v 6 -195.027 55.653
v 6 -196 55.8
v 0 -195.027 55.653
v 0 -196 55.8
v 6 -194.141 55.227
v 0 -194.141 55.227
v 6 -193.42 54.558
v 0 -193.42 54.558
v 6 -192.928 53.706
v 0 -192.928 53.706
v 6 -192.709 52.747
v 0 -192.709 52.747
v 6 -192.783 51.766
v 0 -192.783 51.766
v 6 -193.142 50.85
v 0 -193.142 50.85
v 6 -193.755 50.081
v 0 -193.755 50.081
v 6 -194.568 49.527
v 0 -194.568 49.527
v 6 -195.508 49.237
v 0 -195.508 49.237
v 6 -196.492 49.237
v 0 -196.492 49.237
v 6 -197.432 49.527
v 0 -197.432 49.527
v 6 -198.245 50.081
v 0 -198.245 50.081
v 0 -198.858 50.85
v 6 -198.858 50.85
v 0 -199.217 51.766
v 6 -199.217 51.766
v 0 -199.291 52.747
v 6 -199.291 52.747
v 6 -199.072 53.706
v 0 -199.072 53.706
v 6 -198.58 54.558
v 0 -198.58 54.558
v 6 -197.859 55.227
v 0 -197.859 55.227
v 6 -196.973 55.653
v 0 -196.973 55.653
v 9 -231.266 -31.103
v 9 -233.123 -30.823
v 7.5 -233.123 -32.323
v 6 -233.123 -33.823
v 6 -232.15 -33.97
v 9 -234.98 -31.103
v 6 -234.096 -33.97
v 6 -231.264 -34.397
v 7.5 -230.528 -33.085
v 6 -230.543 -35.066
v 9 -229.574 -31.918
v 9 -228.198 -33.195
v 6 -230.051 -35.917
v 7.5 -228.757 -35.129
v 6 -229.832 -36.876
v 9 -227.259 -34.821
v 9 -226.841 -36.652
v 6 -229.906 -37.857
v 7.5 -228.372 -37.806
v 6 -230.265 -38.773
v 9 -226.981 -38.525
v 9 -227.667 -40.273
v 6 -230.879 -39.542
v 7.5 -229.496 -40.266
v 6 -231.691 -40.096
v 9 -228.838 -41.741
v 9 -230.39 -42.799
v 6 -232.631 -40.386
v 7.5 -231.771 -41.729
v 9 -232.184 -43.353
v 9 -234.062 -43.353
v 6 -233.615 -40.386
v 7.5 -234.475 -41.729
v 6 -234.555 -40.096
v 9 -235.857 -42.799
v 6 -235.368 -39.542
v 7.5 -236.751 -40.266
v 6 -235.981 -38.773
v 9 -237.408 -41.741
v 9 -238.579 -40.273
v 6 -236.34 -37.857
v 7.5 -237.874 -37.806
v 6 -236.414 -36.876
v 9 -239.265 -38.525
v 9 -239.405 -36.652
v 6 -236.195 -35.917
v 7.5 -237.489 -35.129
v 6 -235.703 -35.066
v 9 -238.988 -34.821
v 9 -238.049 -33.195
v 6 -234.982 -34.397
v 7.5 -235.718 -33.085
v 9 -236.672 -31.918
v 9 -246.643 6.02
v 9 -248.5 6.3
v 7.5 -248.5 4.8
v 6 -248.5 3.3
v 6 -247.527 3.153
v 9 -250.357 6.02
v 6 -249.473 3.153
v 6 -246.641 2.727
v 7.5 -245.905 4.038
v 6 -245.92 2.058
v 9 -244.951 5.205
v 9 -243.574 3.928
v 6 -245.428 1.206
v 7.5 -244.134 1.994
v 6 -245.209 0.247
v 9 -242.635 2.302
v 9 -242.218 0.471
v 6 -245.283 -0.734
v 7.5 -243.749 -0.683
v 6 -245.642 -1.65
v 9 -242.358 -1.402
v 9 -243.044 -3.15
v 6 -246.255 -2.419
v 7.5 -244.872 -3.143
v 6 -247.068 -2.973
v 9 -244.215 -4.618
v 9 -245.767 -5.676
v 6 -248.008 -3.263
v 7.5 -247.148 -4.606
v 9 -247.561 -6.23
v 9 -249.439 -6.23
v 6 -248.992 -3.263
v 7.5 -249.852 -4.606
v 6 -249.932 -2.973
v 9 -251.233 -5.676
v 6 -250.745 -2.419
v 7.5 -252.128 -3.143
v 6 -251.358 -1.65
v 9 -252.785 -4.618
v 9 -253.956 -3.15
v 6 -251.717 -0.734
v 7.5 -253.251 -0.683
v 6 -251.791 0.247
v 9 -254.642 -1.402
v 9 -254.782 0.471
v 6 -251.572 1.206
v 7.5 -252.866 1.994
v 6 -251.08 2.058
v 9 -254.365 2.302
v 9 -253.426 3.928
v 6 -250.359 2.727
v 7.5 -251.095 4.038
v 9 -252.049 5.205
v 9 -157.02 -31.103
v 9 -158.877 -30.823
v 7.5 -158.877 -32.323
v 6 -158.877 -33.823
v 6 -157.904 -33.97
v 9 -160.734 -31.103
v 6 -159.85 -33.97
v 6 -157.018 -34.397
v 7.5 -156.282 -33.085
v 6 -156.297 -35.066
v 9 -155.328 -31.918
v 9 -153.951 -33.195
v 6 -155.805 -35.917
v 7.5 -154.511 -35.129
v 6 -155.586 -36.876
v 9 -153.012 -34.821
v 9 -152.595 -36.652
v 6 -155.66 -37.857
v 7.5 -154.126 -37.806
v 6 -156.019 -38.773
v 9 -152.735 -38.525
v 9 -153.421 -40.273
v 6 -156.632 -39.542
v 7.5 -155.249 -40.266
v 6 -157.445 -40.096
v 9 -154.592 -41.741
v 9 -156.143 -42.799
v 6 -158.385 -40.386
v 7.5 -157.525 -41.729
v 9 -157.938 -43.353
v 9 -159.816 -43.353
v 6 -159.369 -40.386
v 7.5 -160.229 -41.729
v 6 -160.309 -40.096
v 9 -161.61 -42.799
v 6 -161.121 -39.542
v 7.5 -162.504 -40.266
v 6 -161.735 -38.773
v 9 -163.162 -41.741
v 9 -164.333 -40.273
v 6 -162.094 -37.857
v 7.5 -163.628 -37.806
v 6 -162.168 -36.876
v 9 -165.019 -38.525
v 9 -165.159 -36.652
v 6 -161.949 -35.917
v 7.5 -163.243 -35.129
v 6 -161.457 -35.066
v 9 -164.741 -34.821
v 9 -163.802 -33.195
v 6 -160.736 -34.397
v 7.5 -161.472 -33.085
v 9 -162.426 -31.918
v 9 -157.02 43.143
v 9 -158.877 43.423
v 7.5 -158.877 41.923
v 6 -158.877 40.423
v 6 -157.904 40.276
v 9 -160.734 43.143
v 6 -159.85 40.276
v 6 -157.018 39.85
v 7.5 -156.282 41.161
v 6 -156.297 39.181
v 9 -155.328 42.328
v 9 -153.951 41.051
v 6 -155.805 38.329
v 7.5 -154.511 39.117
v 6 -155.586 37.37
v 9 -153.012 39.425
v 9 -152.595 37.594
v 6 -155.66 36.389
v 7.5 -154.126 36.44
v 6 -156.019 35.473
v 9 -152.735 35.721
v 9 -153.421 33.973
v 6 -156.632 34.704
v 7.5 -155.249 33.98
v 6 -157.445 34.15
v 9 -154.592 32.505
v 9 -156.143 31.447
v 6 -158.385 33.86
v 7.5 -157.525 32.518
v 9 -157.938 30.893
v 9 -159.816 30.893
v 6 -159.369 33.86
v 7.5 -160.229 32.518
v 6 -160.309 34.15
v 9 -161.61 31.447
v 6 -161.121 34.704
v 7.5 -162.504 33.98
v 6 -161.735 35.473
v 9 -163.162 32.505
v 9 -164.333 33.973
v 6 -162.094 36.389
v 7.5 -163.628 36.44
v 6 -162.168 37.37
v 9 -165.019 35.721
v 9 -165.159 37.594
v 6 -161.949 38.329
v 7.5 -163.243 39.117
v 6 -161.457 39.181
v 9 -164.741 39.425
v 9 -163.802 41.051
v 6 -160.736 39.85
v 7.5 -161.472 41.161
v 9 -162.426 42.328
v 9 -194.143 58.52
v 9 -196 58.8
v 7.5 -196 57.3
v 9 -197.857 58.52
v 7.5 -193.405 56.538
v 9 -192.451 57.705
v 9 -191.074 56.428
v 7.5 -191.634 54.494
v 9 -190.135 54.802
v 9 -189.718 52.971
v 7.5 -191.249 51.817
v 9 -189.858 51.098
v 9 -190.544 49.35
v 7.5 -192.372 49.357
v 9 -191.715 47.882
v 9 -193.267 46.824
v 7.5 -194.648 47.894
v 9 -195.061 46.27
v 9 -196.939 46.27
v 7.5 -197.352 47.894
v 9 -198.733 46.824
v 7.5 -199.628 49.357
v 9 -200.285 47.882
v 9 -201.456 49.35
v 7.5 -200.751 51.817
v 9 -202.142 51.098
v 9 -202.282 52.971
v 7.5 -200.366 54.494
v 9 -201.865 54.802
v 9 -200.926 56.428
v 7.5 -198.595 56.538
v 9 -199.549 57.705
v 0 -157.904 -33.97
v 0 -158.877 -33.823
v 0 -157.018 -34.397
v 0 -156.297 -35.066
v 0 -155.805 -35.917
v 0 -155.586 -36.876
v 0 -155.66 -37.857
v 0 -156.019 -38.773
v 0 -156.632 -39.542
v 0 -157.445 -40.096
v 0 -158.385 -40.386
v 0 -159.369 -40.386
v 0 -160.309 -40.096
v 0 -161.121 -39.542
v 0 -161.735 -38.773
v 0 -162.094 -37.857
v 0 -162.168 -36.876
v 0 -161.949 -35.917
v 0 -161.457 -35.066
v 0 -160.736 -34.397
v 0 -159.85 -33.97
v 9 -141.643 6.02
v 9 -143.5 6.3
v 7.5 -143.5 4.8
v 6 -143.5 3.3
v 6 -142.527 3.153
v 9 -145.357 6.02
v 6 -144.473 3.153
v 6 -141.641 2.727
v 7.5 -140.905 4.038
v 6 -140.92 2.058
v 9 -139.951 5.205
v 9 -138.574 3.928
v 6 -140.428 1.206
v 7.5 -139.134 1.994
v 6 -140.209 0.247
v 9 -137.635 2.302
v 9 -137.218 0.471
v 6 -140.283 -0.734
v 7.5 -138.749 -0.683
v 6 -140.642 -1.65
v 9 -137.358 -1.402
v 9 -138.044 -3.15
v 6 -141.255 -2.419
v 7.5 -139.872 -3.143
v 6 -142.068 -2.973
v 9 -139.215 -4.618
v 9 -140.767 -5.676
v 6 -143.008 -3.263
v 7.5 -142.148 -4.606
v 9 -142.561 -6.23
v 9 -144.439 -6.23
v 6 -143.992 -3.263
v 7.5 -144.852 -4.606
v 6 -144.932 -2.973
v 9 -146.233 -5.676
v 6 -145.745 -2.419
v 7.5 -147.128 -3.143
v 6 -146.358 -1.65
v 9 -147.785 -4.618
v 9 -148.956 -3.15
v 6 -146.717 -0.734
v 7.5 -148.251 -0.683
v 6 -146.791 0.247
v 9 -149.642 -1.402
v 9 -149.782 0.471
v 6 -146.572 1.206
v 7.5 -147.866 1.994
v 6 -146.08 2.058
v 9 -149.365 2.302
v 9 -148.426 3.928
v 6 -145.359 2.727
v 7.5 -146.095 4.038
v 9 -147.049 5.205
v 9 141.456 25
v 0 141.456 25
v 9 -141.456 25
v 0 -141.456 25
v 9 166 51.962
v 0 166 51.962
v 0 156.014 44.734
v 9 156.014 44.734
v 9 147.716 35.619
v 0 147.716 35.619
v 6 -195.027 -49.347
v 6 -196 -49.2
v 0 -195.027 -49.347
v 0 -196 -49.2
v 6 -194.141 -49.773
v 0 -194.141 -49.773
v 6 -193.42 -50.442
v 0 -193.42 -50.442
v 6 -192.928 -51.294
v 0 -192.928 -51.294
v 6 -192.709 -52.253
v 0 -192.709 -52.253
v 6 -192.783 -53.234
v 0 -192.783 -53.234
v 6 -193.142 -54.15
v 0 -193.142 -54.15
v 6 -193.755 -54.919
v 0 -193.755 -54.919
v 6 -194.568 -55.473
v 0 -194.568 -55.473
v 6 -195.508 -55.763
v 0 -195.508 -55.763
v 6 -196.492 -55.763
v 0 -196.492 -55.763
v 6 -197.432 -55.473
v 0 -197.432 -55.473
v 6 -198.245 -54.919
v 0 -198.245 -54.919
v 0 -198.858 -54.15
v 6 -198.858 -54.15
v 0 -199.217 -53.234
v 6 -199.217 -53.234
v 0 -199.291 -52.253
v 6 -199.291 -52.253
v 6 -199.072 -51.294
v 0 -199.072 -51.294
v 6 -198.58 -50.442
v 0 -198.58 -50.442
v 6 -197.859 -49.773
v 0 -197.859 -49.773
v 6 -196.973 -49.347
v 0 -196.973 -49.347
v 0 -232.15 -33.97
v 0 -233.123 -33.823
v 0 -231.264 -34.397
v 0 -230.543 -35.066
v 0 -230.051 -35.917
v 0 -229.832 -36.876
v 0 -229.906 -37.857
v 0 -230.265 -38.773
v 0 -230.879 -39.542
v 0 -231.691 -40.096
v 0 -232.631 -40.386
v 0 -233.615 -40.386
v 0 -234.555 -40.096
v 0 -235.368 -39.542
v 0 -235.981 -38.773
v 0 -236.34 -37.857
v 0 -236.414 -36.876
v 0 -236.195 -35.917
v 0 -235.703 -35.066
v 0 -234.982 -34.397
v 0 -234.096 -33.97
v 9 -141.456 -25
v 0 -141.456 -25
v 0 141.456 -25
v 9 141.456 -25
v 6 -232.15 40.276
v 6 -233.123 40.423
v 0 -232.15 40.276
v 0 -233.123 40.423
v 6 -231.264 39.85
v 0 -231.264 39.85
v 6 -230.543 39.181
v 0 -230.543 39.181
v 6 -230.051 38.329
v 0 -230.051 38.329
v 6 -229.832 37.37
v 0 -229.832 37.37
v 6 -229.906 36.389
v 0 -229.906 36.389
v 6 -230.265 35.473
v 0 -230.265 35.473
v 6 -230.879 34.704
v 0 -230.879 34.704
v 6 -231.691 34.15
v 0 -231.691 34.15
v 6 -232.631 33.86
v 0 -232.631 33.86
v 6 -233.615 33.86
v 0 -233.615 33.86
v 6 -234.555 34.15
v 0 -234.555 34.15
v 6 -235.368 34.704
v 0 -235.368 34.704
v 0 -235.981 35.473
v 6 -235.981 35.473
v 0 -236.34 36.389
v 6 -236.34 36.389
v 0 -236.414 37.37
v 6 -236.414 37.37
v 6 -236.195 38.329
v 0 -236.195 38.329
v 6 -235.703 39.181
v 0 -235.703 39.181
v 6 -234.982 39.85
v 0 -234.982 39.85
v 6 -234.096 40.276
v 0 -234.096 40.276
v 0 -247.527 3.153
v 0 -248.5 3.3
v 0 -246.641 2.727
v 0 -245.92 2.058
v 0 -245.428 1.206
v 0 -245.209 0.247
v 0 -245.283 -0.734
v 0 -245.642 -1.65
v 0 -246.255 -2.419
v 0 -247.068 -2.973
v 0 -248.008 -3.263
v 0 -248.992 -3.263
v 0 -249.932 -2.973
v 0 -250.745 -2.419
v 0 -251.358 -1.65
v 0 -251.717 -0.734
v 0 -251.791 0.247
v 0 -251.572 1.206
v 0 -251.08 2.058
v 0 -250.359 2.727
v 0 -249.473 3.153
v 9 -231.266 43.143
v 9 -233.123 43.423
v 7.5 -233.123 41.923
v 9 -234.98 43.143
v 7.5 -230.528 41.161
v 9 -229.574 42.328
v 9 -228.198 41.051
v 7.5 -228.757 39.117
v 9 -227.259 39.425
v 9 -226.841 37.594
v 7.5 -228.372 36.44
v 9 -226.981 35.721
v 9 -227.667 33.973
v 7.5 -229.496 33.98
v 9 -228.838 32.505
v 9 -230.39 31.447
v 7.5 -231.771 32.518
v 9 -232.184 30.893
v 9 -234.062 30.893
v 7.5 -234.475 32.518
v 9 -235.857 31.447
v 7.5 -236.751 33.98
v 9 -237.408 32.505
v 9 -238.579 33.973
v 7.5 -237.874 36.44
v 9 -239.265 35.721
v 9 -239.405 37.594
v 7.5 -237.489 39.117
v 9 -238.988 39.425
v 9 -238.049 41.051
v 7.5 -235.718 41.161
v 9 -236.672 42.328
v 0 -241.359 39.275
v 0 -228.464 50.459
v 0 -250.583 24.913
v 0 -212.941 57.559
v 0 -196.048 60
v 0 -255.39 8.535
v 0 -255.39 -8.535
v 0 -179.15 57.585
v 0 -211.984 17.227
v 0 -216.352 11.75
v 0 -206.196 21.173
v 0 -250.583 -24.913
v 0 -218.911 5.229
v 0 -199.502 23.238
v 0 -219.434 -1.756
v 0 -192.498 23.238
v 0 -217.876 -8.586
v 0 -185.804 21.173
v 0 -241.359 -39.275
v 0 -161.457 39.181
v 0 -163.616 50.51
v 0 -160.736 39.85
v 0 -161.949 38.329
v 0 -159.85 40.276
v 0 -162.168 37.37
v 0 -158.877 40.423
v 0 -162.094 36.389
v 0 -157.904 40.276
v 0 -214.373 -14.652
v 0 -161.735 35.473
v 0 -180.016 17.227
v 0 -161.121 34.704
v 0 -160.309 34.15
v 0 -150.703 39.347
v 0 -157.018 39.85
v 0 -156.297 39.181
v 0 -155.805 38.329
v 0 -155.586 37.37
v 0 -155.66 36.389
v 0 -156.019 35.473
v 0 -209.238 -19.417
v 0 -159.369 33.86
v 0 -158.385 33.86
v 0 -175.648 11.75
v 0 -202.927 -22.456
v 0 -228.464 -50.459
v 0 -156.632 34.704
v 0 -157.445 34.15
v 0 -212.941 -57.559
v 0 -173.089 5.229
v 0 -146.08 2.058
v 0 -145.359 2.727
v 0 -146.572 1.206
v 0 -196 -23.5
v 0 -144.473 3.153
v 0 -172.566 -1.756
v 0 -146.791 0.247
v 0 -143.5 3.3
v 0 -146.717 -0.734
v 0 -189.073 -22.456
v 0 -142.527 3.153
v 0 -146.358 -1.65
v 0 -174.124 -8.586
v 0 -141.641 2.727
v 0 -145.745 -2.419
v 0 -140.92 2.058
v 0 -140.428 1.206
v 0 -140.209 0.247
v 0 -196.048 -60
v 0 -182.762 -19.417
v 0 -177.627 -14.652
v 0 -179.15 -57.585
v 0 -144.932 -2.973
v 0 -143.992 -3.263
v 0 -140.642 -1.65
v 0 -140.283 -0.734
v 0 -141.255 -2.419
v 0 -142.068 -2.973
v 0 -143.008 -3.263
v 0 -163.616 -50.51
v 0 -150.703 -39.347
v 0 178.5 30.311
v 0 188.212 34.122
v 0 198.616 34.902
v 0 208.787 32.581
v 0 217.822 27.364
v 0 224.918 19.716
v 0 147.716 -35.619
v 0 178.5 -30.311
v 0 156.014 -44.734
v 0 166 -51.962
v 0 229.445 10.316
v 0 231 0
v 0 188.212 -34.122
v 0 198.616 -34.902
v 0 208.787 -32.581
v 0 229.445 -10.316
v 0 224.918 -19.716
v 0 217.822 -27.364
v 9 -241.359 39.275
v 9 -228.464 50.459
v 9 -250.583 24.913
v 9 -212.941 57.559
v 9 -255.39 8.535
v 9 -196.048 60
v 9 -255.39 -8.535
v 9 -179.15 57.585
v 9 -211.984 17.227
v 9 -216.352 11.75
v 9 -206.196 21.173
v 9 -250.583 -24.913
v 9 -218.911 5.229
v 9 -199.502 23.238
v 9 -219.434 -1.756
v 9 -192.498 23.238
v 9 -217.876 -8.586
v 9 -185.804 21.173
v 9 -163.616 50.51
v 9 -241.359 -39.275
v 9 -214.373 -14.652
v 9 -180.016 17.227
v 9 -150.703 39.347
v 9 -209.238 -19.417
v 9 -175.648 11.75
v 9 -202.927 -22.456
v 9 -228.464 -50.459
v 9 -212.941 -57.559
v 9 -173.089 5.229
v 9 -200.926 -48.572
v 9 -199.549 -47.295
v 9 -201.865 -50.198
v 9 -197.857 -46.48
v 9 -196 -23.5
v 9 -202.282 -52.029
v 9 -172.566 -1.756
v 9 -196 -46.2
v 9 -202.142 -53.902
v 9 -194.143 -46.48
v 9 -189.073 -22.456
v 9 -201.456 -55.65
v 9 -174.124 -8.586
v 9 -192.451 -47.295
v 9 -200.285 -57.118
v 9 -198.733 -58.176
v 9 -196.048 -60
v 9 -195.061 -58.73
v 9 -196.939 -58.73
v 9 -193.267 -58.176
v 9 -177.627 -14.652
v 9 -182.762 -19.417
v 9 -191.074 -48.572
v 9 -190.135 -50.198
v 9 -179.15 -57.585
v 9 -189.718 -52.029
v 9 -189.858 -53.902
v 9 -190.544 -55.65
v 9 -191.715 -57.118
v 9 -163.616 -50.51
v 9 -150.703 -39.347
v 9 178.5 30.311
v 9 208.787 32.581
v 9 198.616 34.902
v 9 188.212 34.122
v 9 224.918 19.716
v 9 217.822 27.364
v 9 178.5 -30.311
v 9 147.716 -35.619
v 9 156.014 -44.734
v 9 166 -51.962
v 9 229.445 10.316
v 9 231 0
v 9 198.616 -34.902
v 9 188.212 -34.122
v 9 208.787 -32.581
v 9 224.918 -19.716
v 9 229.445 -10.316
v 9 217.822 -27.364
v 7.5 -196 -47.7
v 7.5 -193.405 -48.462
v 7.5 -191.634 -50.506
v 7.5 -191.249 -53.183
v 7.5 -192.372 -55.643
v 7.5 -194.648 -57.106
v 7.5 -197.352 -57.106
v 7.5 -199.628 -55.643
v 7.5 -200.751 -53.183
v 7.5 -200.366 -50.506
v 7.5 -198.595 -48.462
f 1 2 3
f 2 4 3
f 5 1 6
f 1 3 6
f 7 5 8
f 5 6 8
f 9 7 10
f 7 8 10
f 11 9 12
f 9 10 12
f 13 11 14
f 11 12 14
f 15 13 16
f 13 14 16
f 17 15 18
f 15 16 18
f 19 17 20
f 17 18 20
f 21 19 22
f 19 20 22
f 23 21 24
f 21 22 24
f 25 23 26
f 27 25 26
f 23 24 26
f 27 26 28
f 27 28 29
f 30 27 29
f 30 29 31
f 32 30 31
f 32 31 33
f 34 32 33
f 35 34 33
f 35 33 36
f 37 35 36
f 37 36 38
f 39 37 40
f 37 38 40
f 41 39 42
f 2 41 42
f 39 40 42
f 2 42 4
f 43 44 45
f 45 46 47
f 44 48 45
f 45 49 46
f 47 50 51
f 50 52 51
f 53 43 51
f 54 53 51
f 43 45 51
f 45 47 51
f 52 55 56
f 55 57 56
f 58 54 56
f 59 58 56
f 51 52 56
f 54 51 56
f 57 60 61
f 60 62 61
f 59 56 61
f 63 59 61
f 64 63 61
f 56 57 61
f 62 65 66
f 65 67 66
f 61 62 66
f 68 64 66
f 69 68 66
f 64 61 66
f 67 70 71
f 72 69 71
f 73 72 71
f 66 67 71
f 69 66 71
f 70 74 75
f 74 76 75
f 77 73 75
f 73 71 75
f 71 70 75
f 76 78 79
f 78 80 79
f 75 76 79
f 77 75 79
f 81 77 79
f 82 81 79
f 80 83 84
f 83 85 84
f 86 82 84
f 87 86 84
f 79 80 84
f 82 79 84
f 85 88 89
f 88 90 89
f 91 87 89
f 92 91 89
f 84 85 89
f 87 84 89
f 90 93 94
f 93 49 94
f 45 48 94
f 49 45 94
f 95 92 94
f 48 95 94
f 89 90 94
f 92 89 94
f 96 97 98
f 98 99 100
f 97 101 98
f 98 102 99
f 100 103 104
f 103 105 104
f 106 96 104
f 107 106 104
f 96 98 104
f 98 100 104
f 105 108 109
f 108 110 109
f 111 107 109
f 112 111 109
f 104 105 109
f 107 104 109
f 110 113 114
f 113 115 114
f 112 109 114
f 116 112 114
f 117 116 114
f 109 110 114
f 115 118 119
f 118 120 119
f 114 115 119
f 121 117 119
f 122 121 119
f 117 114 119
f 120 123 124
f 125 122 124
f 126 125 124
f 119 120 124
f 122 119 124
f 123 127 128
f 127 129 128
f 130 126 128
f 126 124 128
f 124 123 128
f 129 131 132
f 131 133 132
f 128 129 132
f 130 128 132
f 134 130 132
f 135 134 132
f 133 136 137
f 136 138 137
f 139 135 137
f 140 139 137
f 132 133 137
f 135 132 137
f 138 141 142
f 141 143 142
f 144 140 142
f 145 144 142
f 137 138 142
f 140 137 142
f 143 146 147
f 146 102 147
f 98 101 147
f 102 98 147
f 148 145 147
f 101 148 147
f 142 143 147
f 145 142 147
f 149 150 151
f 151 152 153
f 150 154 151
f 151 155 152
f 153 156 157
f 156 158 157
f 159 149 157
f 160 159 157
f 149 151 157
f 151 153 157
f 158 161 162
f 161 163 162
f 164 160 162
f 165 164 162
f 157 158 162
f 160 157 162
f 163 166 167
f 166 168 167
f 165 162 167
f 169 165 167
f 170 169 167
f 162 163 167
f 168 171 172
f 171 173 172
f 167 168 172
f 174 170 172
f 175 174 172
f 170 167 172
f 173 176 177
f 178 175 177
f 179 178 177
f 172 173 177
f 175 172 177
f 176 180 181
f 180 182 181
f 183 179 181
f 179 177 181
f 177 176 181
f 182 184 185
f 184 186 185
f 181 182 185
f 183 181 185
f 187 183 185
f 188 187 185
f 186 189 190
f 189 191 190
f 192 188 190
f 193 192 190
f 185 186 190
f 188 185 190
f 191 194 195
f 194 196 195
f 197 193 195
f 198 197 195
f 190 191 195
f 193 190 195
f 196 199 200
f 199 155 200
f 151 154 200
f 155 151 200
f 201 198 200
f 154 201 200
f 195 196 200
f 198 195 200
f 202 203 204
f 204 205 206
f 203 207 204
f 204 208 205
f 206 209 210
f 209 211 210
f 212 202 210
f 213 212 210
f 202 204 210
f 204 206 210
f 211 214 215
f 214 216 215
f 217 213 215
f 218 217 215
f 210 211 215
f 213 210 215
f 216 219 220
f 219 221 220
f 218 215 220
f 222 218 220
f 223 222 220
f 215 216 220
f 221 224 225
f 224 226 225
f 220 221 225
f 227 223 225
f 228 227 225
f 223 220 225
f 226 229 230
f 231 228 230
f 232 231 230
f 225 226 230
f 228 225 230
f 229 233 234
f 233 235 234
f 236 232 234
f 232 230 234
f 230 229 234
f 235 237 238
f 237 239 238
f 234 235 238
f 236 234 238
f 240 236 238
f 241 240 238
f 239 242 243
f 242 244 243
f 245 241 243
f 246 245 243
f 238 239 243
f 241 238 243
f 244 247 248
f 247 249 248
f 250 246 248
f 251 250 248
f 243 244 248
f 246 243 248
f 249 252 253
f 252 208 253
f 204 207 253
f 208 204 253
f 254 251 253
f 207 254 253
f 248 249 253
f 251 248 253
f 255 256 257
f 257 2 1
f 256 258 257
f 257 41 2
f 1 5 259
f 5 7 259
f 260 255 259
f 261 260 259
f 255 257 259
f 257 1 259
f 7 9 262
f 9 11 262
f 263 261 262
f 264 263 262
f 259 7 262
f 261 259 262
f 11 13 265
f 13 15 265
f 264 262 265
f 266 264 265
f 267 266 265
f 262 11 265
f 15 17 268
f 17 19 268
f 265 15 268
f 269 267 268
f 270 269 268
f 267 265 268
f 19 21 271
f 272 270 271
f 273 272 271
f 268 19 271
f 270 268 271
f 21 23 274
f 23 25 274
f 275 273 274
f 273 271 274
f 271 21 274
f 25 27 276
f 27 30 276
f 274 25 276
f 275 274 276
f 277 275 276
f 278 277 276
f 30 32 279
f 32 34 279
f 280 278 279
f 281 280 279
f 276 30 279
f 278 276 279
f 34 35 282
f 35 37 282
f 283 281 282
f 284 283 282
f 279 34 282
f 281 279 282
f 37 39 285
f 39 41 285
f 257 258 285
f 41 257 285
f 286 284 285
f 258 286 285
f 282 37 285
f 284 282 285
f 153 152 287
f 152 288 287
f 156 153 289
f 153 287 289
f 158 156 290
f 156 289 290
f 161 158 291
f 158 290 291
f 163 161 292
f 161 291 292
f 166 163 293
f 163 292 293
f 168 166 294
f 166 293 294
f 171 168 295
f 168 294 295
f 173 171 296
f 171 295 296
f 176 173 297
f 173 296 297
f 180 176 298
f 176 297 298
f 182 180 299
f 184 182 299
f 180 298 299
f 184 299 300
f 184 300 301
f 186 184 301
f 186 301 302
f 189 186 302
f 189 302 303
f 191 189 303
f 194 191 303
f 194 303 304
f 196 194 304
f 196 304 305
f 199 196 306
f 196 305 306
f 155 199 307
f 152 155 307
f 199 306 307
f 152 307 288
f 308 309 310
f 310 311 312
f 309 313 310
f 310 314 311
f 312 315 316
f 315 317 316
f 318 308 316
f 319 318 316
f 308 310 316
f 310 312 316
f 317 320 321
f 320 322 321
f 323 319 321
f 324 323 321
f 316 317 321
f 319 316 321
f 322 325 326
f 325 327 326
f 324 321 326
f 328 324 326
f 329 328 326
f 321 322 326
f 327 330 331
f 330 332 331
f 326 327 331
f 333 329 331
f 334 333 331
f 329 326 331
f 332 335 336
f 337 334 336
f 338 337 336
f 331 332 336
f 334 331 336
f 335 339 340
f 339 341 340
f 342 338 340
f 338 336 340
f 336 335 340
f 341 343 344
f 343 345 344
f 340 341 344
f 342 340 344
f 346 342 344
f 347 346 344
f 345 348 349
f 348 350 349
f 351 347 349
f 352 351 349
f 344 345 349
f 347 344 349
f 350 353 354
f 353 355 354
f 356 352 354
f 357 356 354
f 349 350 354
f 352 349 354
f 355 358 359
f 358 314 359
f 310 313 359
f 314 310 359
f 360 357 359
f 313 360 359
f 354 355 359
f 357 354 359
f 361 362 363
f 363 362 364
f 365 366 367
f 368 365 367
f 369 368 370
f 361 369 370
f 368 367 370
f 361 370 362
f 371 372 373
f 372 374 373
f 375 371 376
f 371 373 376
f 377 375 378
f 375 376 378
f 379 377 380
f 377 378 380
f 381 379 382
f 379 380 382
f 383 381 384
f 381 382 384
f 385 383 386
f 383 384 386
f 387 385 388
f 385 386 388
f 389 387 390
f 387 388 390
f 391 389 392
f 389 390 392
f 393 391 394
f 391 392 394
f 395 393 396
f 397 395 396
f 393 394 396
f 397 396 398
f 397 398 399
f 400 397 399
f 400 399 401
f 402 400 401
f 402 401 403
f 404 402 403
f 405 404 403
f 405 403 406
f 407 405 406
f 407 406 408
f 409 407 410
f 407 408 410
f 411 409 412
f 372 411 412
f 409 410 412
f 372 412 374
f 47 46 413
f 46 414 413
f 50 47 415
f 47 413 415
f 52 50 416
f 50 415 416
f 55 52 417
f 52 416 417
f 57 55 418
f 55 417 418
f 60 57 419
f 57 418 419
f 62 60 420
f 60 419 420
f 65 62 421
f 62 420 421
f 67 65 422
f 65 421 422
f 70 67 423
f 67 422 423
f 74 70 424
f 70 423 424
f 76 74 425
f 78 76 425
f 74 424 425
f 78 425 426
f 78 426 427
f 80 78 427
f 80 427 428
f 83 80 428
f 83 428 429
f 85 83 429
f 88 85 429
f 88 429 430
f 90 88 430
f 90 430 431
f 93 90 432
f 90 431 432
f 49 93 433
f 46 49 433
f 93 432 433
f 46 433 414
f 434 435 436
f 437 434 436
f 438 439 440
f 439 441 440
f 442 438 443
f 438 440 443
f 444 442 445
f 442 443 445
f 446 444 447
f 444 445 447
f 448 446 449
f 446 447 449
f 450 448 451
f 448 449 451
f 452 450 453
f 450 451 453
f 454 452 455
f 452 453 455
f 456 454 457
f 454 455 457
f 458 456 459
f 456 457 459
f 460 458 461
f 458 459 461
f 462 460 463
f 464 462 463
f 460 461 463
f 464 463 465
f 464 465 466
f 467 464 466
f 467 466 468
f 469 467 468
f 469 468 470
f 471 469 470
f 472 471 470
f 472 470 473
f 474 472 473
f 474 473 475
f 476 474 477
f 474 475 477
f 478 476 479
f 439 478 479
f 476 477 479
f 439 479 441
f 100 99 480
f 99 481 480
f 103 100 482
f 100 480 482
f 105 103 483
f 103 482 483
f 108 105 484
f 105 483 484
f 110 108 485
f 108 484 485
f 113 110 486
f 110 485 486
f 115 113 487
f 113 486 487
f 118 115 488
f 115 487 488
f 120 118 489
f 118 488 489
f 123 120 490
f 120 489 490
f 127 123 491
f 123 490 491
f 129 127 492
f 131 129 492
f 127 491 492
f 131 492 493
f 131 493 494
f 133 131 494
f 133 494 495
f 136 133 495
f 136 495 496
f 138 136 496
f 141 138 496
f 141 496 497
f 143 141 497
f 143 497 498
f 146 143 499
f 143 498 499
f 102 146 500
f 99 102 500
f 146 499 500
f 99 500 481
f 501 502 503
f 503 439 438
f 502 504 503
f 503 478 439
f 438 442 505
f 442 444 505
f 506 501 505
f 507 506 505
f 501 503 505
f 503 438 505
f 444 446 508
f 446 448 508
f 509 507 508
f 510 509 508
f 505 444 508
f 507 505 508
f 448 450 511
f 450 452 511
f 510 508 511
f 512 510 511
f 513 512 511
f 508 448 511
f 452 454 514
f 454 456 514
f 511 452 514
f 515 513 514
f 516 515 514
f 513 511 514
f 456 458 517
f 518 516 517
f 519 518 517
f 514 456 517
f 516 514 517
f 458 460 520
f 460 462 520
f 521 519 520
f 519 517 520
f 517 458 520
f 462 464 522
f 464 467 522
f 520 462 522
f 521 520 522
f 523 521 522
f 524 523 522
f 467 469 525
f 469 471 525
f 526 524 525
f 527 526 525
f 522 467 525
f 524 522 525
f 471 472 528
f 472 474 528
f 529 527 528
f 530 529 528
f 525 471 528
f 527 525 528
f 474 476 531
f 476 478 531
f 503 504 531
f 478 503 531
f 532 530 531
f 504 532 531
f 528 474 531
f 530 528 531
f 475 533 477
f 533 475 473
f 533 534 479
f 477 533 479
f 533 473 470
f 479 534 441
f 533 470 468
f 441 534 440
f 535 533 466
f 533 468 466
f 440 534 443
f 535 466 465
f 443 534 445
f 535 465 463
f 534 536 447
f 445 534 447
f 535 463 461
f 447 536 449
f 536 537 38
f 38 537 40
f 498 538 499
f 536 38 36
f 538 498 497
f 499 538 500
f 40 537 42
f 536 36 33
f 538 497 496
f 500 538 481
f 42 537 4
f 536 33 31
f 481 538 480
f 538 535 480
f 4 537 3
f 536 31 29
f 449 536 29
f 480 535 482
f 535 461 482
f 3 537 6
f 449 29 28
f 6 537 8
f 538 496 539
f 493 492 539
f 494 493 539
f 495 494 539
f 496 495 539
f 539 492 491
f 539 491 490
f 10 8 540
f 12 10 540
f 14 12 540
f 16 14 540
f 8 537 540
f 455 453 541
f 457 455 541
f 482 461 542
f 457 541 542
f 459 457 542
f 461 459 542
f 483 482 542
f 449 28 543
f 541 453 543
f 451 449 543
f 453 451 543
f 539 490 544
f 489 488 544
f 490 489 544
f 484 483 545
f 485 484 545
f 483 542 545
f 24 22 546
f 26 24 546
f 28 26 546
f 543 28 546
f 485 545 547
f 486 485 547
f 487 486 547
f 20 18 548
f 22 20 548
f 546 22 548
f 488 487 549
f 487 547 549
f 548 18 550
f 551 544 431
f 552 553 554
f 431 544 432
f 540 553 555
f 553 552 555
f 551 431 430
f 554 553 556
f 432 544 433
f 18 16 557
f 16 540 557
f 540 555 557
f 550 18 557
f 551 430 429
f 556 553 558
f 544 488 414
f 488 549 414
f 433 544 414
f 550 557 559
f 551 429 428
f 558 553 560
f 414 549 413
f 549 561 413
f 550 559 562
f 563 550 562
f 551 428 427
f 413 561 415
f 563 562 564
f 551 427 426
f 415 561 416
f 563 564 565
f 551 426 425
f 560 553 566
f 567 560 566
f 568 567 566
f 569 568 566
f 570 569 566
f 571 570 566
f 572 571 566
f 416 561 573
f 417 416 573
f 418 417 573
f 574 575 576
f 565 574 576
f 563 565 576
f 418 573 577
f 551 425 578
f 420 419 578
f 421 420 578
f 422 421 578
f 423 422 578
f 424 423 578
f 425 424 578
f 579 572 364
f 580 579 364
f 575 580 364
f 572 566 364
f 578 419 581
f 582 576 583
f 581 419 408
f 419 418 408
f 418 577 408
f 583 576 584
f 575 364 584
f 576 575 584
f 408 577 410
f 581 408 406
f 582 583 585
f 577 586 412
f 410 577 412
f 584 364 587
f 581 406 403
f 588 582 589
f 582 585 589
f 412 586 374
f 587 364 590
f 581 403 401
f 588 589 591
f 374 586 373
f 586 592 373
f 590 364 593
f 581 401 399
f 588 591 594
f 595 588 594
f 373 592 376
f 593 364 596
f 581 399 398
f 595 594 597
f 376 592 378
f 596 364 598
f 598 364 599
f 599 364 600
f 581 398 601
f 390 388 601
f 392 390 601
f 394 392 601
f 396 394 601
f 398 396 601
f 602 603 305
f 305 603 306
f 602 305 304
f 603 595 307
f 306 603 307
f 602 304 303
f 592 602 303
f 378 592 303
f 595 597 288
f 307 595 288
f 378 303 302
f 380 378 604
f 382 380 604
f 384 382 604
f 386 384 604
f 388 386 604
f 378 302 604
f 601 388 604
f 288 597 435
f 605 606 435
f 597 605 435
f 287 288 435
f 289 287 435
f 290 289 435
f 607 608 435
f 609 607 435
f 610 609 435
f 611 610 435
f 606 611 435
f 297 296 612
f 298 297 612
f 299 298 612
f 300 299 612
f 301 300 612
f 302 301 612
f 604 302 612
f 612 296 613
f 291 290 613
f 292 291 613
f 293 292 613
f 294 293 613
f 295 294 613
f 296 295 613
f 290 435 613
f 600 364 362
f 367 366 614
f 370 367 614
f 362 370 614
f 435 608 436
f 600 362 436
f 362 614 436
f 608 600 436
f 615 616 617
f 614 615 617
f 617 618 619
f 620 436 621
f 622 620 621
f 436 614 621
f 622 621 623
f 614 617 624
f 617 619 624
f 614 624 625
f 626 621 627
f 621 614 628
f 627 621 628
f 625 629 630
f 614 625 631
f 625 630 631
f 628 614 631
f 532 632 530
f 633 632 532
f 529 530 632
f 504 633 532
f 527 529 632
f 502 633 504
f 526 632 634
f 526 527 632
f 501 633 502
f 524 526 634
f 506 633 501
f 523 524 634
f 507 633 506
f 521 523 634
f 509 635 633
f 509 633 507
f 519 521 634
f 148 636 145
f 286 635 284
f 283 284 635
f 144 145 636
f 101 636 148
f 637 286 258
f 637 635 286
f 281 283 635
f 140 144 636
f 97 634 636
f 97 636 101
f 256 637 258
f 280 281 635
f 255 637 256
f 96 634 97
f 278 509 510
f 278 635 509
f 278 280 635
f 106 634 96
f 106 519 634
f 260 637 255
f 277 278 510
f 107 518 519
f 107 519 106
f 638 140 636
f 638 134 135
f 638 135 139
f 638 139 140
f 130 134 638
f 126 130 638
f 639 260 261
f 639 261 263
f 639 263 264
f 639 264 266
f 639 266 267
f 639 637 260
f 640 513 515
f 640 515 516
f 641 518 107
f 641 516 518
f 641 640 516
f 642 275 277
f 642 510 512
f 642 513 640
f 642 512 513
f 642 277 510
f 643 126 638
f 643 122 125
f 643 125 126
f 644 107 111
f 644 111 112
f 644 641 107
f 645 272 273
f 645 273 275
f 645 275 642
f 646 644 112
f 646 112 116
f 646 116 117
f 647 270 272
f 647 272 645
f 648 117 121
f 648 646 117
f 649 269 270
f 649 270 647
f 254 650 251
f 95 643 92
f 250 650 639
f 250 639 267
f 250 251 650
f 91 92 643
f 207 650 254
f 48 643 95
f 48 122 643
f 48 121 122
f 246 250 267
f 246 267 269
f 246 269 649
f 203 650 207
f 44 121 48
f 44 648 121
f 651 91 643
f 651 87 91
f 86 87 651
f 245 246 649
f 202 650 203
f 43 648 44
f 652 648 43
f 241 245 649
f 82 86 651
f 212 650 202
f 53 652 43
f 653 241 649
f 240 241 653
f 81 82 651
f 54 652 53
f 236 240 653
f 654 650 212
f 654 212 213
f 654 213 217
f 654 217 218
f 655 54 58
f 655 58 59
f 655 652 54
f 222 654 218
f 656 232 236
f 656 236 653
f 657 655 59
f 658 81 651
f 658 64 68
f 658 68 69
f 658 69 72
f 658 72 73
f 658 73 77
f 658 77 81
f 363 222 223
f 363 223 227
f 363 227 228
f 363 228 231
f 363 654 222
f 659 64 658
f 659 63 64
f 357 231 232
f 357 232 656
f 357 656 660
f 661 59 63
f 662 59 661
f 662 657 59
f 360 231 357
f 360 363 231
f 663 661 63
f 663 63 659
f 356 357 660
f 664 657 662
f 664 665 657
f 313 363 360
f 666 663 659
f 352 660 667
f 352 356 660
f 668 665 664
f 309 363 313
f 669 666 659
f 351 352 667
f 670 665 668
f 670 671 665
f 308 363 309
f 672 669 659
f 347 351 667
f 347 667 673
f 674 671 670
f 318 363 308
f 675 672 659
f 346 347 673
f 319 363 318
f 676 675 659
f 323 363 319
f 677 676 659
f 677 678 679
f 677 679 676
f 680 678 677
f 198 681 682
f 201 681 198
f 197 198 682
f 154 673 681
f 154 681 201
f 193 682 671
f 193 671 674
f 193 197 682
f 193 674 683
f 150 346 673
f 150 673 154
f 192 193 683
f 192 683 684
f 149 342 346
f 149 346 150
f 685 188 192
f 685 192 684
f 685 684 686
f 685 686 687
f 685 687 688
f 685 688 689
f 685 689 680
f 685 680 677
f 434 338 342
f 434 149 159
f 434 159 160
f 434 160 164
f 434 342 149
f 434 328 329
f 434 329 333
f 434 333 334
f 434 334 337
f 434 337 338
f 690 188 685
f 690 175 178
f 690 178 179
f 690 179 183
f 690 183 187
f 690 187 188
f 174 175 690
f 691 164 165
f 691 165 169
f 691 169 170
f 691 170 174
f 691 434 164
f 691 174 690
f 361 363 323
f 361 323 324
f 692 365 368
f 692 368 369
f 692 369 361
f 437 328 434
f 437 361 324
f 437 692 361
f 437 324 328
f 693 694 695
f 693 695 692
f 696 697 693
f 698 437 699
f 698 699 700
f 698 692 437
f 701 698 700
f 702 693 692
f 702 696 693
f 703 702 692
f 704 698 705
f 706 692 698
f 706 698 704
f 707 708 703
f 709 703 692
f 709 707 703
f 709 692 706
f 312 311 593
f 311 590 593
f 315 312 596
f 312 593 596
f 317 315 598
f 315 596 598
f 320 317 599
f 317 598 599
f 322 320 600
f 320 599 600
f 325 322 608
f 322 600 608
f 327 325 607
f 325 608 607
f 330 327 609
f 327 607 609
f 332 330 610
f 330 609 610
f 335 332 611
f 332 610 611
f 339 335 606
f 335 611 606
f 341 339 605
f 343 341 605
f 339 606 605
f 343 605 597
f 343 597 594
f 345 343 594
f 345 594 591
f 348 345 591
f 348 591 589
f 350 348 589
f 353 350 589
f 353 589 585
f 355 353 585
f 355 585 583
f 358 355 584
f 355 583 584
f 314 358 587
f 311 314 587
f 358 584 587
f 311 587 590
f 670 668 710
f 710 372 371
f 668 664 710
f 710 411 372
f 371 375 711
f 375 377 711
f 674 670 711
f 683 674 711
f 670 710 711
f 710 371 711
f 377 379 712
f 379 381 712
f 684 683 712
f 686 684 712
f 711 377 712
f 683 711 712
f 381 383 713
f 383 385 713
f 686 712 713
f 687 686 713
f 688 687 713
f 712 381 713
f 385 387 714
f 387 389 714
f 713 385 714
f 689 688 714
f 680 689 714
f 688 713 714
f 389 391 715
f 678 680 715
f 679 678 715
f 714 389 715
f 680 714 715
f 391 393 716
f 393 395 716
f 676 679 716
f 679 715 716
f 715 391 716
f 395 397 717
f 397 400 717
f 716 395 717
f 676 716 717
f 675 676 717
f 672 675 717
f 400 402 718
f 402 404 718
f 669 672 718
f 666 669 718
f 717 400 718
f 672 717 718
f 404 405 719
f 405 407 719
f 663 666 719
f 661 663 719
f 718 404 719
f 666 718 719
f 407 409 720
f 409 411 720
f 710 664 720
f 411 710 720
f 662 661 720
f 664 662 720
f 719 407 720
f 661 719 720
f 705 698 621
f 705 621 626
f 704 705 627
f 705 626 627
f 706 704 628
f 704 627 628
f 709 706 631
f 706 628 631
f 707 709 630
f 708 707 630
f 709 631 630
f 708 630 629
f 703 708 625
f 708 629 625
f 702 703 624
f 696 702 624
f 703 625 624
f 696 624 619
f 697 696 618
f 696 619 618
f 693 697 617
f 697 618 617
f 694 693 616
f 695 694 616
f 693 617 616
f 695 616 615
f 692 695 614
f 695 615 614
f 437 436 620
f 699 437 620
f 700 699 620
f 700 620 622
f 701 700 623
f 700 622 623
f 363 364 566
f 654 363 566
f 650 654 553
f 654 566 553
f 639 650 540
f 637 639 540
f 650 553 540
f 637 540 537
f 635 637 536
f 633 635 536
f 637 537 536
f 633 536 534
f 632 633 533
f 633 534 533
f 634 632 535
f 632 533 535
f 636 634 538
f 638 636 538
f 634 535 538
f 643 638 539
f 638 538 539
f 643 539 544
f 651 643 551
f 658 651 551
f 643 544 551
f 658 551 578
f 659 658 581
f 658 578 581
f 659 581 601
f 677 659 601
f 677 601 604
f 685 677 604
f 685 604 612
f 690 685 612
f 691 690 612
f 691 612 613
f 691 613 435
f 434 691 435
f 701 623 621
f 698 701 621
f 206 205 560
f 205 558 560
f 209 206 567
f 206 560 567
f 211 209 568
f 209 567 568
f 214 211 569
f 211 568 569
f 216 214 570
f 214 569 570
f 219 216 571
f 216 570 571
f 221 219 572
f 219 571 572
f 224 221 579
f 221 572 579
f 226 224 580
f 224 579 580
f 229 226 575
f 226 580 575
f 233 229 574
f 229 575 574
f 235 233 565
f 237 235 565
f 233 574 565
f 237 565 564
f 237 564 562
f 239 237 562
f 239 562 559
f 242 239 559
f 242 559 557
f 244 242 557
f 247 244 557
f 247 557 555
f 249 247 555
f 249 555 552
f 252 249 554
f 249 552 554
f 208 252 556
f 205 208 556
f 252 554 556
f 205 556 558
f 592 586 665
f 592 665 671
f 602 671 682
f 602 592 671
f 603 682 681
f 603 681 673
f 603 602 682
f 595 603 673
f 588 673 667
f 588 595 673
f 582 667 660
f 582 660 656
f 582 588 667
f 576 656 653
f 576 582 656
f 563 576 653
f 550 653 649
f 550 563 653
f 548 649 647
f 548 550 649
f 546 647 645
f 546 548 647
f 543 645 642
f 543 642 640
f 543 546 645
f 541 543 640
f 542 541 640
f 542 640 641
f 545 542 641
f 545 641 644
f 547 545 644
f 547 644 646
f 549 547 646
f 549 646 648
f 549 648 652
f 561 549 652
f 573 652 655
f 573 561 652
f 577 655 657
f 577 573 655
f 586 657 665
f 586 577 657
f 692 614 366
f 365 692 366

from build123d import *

# Parameters (mm, degrees)
SKETCH1_R                                           = 23.5
BOSS_EXTRUDE1_DEPTH                                 = 9
CSK_FOR_M6_COUNTERSUNK_FLAT_HEAD_SCREW1_D           = 6.6
CSK_FOR_M6_COUNTERSUNK_FLAT_HEAD_SCREW1_CSINK_D     = 12.6
CSK_FOR_M6_COUNTERSUNK_FLAT_HEAD_SCREW1_CSINK_ANGLE = 90


with BuildPart() as part:
    # Sketch1 → Boss-Extrude1 (new body)
    with BuildSketch(Plane(origin=(0, 0, 0), x_dir=(0, 0, -1), z_dir=(1, 0, 0))):
        with BuildLine():
            Line((-30.310889132, 178.5), (-51.961524227, 166))
            ThreePointArc((-51.961524227, 166), (-40.390167668, 151.630704809), (-25, 141.456439427))
            Line((-25, 141.456439427), (-25, -141.456439427))
            ThreePointArc((-25, -141.456439427), (0, -256), (25, -141.456439427))
            Line((25, -141.456439427), (25, 141.456439427))
            ThreePointArc((25, 141.456439427), (40.390167668, 151.630704809), (51.961524227, 166))
            Line((51.961524227, 166), (30.310889132, 178.5))
            ThreePointArc((30.310889132, 178.5), (0, 231), (-30.310889132, 178.5))
        make_face()
        with Locations((0, -196)):
            Circle(SKETCH1_R, mode=Mode.SUBTRACT)
    extrude(amount=BOSS_EXTRUDE1_DEPTH)

    # CSK for M6 Countersunk Flat Head Screw1 (through all)
    with Locations(Plane(origin=(9, 0, 0), x_dir=(0, 0, -1), z_dir=(1, 0, 0))):
        with Locations((-37.123106012, -158.876893988), (0, -143.5), (37.123106012, -158.876893988), (52.5, -196), (37.123106012, -233.123106012), (0, -248.5), (-37.123106012, -233.123106012), (-52.5, -196)):
            CounterSinkHole(CSK_FOR_M6_COUNTERSUNK_FLAT_HEAD_SCREW1_D / 2, CSK_FOR_M6_COUNTERSUNK_FLAT_HEAD_SCREW1_CSINK_D / 2, counter_sink_angle=CSK_FOR_M6_COUNTERSUNK_FLAT_HEAD_SCREW1_CSINK_ANGLE)


solid = part.part
